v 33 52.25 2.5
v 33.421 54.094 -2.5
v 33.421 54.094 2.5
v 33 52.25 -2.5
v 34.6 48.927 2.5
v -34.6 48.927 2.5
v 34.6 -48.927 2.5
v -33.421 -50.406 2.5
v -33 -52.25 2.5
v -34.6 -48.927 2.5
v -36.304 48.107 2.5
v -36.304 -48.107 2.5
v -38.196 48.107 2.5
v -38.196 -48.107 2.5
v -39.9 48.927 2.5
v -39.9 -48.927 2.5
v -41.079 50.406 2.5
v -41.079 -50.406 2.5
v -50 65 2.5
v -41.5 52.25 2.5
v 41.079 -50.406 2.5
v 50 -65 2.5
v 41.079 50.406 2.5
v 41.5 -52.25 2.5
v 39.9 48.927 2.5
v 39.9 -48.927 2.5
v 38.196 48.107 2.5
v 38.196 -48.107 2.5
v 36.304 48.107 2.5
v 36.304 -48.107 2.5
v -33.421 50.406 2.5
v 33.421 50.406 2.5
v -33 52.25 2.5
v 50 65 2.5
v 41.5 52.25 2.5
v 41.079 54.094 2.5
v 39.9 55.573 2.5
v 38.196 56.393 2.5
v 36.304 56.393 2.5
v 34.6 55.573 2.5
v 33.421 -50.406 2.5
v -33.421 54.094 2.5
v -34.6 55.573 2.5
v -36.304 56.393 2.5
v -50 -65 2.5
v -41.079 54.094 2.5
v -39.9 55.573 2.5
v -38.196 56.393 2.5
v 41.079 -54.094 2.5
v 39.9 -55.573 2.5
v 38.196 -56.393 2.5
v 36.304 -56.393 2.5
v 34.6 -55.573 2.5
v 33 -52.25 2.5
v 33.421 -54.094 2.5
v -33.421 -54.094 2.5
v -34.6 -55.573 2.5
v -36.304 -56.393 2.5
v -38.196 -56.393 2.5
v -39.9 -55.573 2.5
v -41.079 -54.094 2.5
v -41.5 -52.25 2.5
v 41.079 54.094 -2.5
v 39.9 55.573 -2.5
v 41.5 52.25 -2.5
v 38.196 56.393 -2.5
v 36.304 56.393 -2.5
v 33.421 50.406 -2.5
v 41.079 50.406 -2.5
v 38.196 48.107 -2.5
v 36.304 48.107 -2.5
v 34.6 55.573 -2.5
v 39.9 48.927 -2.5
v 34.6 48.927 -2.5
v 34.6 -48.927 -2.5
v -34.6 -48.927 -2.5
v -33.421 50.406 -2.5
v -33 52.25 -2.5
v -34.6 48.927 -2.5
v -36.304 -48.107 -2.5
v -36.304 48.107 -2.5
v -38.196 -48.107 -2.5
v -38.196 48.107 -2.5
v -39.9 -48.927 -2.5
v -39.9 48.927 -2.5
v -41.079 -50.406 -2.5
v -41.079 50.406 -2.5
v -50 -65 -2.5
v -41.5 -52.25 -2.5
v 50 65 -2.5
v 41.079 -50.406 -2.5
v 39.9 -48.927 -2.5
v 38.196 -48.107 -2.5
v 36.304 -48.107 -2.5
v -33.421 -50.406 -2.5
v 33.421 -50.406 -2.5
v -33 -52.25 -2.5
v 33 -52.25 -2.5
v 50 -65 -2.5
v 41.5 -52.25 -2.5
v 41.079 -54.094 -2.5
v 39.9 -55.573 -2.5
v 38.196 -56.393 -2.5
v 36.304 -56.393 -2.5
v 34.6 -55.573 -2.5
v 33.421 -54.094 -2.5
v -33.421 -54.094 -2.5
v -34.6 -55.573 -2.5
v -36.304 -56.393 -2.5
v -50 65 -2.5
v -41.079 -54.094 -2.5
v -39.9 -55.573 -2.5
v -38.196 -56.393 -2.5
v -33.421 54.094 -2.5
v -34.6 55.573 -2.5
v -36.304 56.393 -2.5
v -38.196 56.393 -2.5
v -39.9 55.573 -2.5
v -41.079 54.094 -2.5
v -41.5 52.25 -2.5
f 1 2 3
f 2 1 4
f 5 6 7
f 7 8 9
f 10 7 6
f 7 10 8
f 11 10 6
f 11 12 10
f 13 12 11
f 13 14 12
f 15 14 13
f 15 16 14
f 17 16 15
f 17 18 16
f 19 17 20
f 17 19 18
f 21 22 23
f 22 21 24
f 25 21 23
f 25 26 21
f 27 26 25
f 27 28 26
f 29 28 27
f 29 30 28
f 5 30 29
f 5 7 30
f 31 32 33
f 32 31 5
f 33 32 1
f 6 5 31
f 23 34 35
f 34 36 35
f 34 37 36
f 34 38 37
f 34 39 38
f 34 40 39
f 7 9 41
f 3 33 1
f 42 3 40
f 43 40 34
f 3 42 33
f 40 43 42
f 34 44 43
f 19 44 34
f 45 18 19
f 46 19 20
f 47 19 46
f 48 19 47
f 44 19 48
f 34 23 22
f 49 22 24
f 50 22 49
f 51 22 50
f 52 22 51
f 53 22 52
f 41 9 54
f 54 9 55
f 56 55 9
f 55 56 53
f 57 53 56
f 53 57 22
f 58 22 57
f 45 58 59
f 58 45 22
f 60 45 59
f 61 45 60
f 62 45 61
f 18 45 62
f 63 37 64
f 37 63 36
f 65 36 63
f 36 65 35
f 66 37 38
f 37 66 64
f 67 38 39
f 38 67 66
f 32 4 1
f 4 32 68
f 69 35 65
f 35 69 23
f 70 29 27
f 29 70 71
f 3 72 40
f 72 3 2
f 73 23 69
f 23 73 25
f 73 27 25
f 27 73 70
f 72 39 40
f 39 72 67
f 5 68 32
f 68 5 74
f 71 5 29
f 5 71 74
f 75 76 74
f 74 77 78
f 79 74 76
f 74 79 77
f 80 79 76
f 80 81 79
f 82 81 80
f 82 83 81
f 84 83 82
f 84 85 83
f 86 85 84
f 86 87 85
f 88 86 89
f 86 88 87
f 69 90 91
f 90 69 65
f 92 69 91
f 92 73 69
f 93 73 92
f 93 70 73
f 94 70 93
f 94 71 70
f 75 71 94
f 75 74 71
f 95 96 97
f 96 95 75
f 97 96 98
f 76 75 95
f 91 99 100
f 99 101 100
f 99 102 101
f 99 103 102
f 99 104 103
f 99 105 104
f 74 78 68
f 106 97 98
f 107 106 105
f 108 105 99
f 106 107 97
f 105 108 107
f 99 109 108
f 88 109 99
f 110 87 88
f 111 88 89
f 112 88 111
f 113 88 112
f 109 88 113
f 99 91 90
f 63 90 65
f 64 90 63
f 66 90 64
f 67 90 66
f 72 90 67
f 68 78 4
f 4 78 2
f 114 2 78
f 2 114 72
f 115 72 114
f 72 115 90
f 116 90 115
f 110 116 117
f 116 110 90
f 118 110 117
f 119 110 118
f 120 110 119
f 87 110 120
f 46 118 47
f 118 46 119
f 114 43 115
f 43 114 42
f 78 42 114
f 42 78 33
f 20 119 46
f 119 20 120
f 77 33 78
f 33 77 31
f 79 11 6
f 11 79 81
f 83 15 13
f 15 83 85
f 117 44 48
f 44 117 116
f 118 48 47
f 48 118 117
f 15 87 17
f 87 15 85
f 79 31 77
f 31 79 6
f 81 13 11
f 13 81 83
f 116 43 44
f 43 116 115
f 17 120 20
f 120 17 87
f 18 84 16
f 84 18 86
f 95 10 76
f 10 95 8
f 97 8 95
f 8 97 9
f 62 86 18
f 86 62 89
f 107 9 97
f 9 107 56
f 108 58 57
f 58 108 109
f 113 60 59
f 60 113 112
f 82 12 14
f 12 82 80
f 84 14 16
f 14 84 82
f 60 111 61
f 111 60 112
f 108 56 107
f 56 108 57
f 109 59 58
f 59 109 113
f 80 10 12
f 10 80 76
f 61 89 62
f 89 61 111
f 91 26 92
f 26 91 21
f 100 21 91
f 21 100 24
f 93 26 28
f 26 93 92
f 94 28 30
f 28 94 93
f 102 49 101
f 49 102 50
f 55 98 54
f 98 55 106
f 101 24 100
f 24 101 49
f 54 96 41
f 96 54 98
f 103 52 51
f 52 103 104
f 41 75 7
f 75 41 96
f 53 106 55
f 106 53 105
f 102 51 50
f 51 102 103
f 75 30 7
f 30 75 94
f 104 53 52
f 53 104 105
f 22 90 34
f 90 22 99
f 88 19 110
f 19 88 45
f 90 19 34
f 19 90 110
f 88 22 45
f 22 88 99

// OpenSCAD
// Generated by SolidPython 1.1.3 on 2023-10-16 12:08:39


difference() {
	cube(center = true, size = [100, 130.0000000000, 5]);
	union() {
		translate(v = [37.2500000000, 52.2500000000]) {
			cylinder(center = true, h = 5, r = 4.2500000000);
		}
		translate(v = [-37.2500000000, 52.2500000000]) {
			cylinder(center = true, h = 5, r = 4.2500000000);
		}
		translate(v = [-37.2500000000, -52.2500000000]) {
			cylinder(center = true, h = 5, r = 4.2500000000);
		}
		translate(v = [37.2500000000, -52.2500000000]) {
			cylinder(center = true, h = 5, r = 4.2500000000);
		}
	}
}
/***********************************************
*********      SolidPython code:      **********
************************************************
 
import solid
import numbers
import pudb
from solid.utils import *
import viewscad
import subprocess
import os
import os.path as osp
import math
import sys

chamfer_extrude=solid.import_scad("./chamfer_extrude.scad")
chamfer_extrude=chamfer_extrude.chamfer_extrude
r = viewscad.Renderer(width=800, height=800)

def debug(model,f_name,path="/home/ts/code/projects/mfd/designs/debug"):
    solid.scad_render_to_file(model,osp.join(path,f_name)+".scad")
#generate position list of wells using offset from center
wells_pos_from_center_4 = lambda offset: [[-offset,offset],
                                        [offset, offset],
                                        [-offset, -offset],
                                        [offset, -offset]]
#wells_pos_from_center_2 = lambda offset: [[0,offset],
#                                        [0, -offset]]
wells_pos_from_center_2 = lambda offset: [[offset,0],
                                        [-offset,0]]

def make_well(dims,shape=None,height=None,dxf=False):
    def circle_cylinder():
        if dxf or (height is None):
            well = solid.circle(r=dims, segments=64)
        else:
            well = solid.cylinder(r=dims, h=height, segments=64, center = True)
        return well
    if dims is None:
        sys.exit("radius needs to be a number")
    if isinstance(dims, numbers.Number):
        well =circle_cylinder()
    elif len(dims)==1:
        if isinstance(dims[1], numbers.Number):
            well =circle_cylinder()
        else:
            sys.exit("radius needs to be a number")
    elif len(dims)==2:
        well = solid.square(dims,center = True)
    elif len(dims)==3:
        well = solid.cube(dims, center = True)
    return well

def wells_top_bottom(center_gap,device_dims=None,shape=None,height=None, positions = None, dxf = False):
    well_shape = make_well(device_dims,shape=shape,height=height,dxf=dxf)
    wells = []
    if positions is None:
        offset = radius+radius/2.0
        positions = wells_pos_from_center_2(offset)
    if dxf or (height is None):
        height = 0
    for position in positions:
        if dxf:
            wells.append(solid.translate([position[0],position[1]])(well_shape))
        else:
            wells.append(solid.translate([position[0],position[1],height/2.0])(well_shape))
    return  union()(*wells)

#place wells in four corners 
def four_corner(radius,height=None, positions = None, dxf = False):
    #if well pos not specified set
    #to equally spaced by half radius
    if positions is None:
        offset = radius+radius/2.0
        positions = wells_pos_from_center_4(offset)
    if dxf or (height is None):
        height = 0
    #make wells at positions with specified radius and height
    wells = []
    for position in positions:
        #make circle if making dxf
        if dxf:
            well_shape = solid.circle(r=radius, segments=64)
            well_shape = solid.translate([position[0],position[1]])(well_shape)
        #if stl make cylinder
        else:
            well_shape = solid.cylinder(r=radius, h=height, segments=64, center = True)
            well_shape = solid.translate([position[0],position[1],height/2.0])(well_shape)
        wells.append(well_shape)
    return  union()(*wells)

#generate channels 
def make_channels(length,width,height=0,num_chans=1,max_chans=None,spacing=None, dxf = False,
                  rotate_channels=False):
    if dxf or (height is None):
        height = 0
    #if channel gap not defined, is equal to
    if spacing is None: spacing = width
    #calculate number of channels if fitting max num within given width
    if not max_chans is None:
        import math
        num_chans = math.floor((max_chans-spacing)/(width+spacing))
    #get total width of channel section  
    total_width = (width*num_chans)+(spacing*(num_chans-1))

    #make template channel
    #if rotate_channels: width, length = length, width
    if dxf:
        channel_t = solid.square([length,width],center = True)
    else:
        channel_t = solid.cube([length,width,height], center = True)

    #if number channels is even, offset the first channel to center its gap
    if num_chans % 2 == 0: centering = -(width/2.0+spacing/2.0)
    else: centering = 0
    #move template channel up to align bottom at z = 0 
    #and offset center if necessary
    if dxf:
        channel_t = solid.translate([0,centering])(channel_t)
    else:
        channel_t = solid.translate([0,centering,height/2.0])(channel_t)

    #if rotate_channels: length,width = width,length
    #start making the channels
    channels = []
    for i in range(num_chans):
        #if i=0 there is no translation
        #if i=1, we make the first channel adjacent to second
        direction = i

        #if i>=1, we add channels alternating left and right
        if i >= 1:
            direction = -(i/2.0)
            if i % 2 == 1: direction = (-direction)+0.5
                
        #make channel at right position and add it to channel list
        translation_coords = [0,direction*(width+spacing)]
        #if rotate_channels: translation_coords = [direction*(width+spacing),0]
        if dxf:
            channel = solid.translate(translation_coords)(channel_t)
        else:
            channel = solid.translate([*translation_coords,0])(channel_t)
        channels.append(channel)
    
    #group all channels as one object
    channels = union()(*channels)
    #compute the x,y,z dimensions in order to pass as arguments 
    #for construction of other parts of device (such as the chambers)
    measurements = {'x':(length/2.0,-length/2.0),
                    'y':(total_width/2.0,-total_width/2.0)}
    if not dxf:
        measurements['z'] = (height,0)
    if rotate_channels:
        channels = solid.rotate(90)(channels)
        measurements['x'],measurements['y']=measurements['y'],measurements['x']
    return channels,measurements

def make_chambers(msrs,height=None,extra=0,len_until=None,width=None, dxf = False):
    #computes x,y,z length
    total = lambda x : abs(x[0]) + abs(x[1])
    
    #if specific height if specified
    #otherwise use same height as channels
    if dxf:
        pass
    elif not height is None:
        msrs['z'] = (height,0)
    else:
        msrs['z'] = (0,0)
        
    #make copy of measurements from channels to modify chamber dimensions 
    #and add length to chambers as specified
    chamber_dims = msrs.copy()
    #calculate length of chamber to reach specified offset
    if not len_until is None:
        chamber_len = len_until-(msrs['x'][0])
    #or add specified length to channel length (if not specified, adds 0)
    else:
        chamber_len = msrs['x'][0]+extra
    #set the chamber length based 
    chamber_dims['x'] = (chamber_len/2.0,-(chamber_len/2.0))
    #compute final dimensions of chamber
    if not width is None:
        chamber_dims['y'] = (width/2.0,-width/2.0)
    chamber_dims = [total(size) for size in chamber_dims.values()]
        
    #calculate chamber translation offset to place adjacent to channels
    chamber_trslt = msrs['x'][0]+(chamber_len/2.0)
    #compute chamber translation coordinates to align with channels
    #x = 1 moves chamber above channels
    #x = -1 moves chamber below channels
    if dxf:
        trslt = lambda x : [x*(chamber_trslt),0]
    else:
        trslt = lambda x : [x*(chamber_trslt),0,msrs['z'][0]/2.0]
    
    #function to make chamber at top or at bottom 
    if dxf:
        move = lambda x : solid.translate(trslt(x))(solid.square(chamber_dims, center = True) )
    else:
        move = lambda x : solid.translate(trslt(x))(solid.cube(chamber_dims,center = True))
    #make top and bottom chambers and return them as grouped
    top = move(1)
    bottom = move(-1)
    #chambers=solid.rotate(90)(solid.union()(top,bottom))
    chambers=(solid.union()(top,bottom))

    return chambers

#create alignment features 
def alignment_features(unit,dims,grid_size, mask_size = None, alignment = "hollow", units_from_center = (2.5,2.5), corner_len=None):
    width = grid_size[0]*dims[0]
    length = grid_size[1]*dims[1]
    if mask_size is None and corner_len is None:
        corner_len = (dims[0] + dims[1]) /2 / 8
    corner = lambda thickness_div : solid.union()( solid.square([corner_len,corner_len/thickness_div],center=False), solid.square([corner_len/thickness_div,corner_len],center=False) )
    
    def make_full(thickness_div):
        thickness = corner_len/thickness_div
        tr = solid.translate([0, 0, 0 ])(solid.rotate(180)(corner(thickness_div)))
        tr = solid.translate([thickness/2,thickness/2,0])(tr)
        bl = solid.translate([0, 0, 0 ])(solid.rotate(0)(corner(thickness_div)))
        bl = solid.translate([-thickness/2,-thickness/2,0])(bl)
        return solid.union()(tr,bl)
    
    def make_hollow(thickness_div):
        thickness = corner_len/(thickness_div/2)
        inner = make_full(thickness_div)
        outer = make_full(thickness_div/2)
        hollow = outer - inner 
        return hollow
    
    center = (width /2 , length/2)
    mask_pos = lambda x,y : (center[0] + x*(float(units_from_center[0])*dims[0]), center[1] + y*(float(units_from_center[1])*dims[1]))
    positions = []
    positions.append(mask_pos(1,0))
    positions.append(mask_pos(0,1))
    positions.append(mask_pos(-1,0))
    positions.append(mask_pos(0,-1))
    make_mask = lambda mtype : make_hollow(8) if mtype == "hollow" else make_full(8)
    masks = [ solid.translate([*position,0])(make_mask(alignment)) for position in positions]
    
    solid.scad_render_to_file(solid.union()(*masks),"./designs/open_chamber/masks.scad")
    #return unit - solid.union()(*masks)
    return solid.union()(*masks,unit)

def create_outline(thickness, array, dims, grid_size,):
    width = grid_size[0]*dims[0] + thickness *2
    length = grid_size[1]*dims[1] + thickness *2
    outer = solid.translate([-thickness, -thickness,0])(solid.square([width, length]))
    return outer-array

def create_wall(wall_thickness, outline_thickness, dims, grid_size, wall_height = 2000, dxf = False):
    inner_width = grid_size[0]*dims[0] + outline_thickness *2
    inner_length = grid_size[1]*dims[1] + outline_thickness *2
    outer_width = inner_width + wall_thickness * 2
    outer_length = inner_length + wall_thickness * 2
    outer_pos_x = -outline_thickness-wall_thickness
    outer_pos_y = -outline_thickness-wall_thickness
    inner_pos_x = -outline_thickness
    inner_pos_y = -outline_thickness
    if dxf:
        inner_wall = solid.translate([inner_pos_x,
                                      inner_pos_y,
                                      0])(solid.square([inner_width, inner_length]))
        outer_wall = solid.translate([outer_pos_x,
                                      outer_pos_y,
                                      0])(solid.square([outer_width, outer_length]))

        return outer_wall-inner_wall
    else:
        inner_wall = solid.translate([inner_pos_x,
                                      inner_pos_y,
                                      0])(solid.cube([inner_width, inner_length,wall_height]))
        outer_wall = solid.translate([outer_pos_x,
                                      outer_pos_y,
                                      0])(solid.cube([outer_width, outer_length,wall_height]))

        return outer_wall-inner_wall, {'wall_height': wall_height,
                                       'wall_thickness': wall_thickness,
                                       'inner_width':inner_width,
                                       'inner_length': inner_length,
                                       'outer_width': outer_width,
                                       'outer_length': outer_length,
                                       'outer_pos_x' : outer_pos_x,
                                       'outer_pos_y' : outer_pos_y,
                                       'inner_pos_x' : inner_pos_x,
                                       'inner_pos_y' : inner_pos_y}

def create_thicker_wall(wall_thickness, outer_wall_offset, wall_dims, dims, grid_size, height_start = .2, height_end=2, dxf = False):
    addon_wall,thicker_wall_dims = create_wall(wall_thickness, outer_wall_offset, dims, grid_size, wall_height=height_end-height_start, dxf = False)
    addon_wall = solid.translate([0,0,height_start])(addon_wall)

    thicker_wall_dims['wall_height'] = height_end
    thicker_wall_dims['wall_thickness'] = wall_dims['wall_thickness'] + wall_thickness
    return addon_wall, thicker_wall_dims
 
def add_lock_to_wall(wall,wall_dims,y_offset = 0,cut_ratio=0.7,L_length=3, gap_ratio=0.05, axis="x",width_ratio=1/2):
    # Makes L shape
    def make_L(max_length,length_thickness,max_width,width_thickness,height,y_offset):
        length = solid.cube([max_length,length_thickness,height])
        width = solid.cube([width_thickness,max_width,height])
        width = solid.translate([max_length-(width_thickness),0,0])(width)
        L = solid.union()(width,length)
        debug(L,"L")
        if axis == "x":
            L = solid.rotate(-90)(L)
            L = solid.translate([0,max_length,0])(L)
        else:
            L = solid.rotate(-180)(L)
            L = solid.translate([max_length,max_width,0])(L)
        return solid.translate([0,0,y_offset])(L)
    
    lock_length = L_length
    lock_width = wall_dims['wall_thickness']*width_ratio
    lock_length_thickness = lock_width/2
    lock_width_thickness = lock_width/2
    L_lock = make_L(lock_length,lock_length_thickness,lock_width,lock_width_thickness, wall_dims['wall_height']-y_offset, y_offset)
    
    margin_space = lock_length - lock_length*(1-gap_ratio)
    key_length = lock_length-margin_space
    key_length_thickness = lock_length_thickness-(margin_space*2)
    key_width = lock_width-(margin_space*2)
    key_width_thickness = lock_width_thickness-(margin_space*2)
    L_key = make_L(key_length,key_length_thickness,key_width,key_width_thickness, wall_dims['wall_height']-y_offset, y_offset)
    L_key = solid.translate([margin_space,margin_space,0])(L_key)
    L = solid.union()(L_lock,L_key)
    debug(L,"L")
    
    #Make cube to be used as negative to split frame in a half
    #Can choose if making left or right negative, specify ratio of split
    def make_negative(right,cut_ratio):
        if axis == "x":
            if right:
                length = wall_dims['outer_length']*(1-cut_ratio)
                pos_x = wall_dims['outer_pos_x']+(wall_dims['outer_length']*cut_ratio)
            else:
                length = wall_dims['outer_length']*(cut_ratio)
                pos_x = wall_dims['outer_pos_x'] 
            negative = solid.cube([wall_dims['outer_width'],length, wall_dims['wall_height']])
            negative = solid.translate([wall_dims['outer_pos_y'],pos_x,0])(negative)
        else:
            if right:
                length = wall_dims['outer_width']*(1-cut_ratio)
                pos_x = wall_dims['outer_pos_y']+(wall_dims['outer_width']*cut_ratio)
            else:
                length = wall_dims['outer_width']*(cut_ratio)
                pos_x = wall_dims['outer_pos_y'] 
            negative = solid.cube([length,wall_dims['outer_length'], wall_dims['wall_height']])
            negative = solid.translate([pos_x,wall_dims['outer_pos_x'],0])(negative)
        return negative, pos_x, length 
                      
    #Make negatives
    negative_right, right_half_pos_x, right_half_length = make_negative(True,cut_ratio)
    negative_left, left_half_pos_x, right_half_length = make_negative(False,cut_ratio)
    #Make halves
    left_half = solid.difference()(wall,negative_right)
    right_half = solid.difference()(wall,negative_left)
    def place_L(L, L_length,L_width):
        #Place L on top wall       
        offset_to_center = (wall_dims['wall_thickness']-L_width)/2
        if axis == "x":
            y_pos_top = (wall_dims['outer_pos_y'] +
                    wall_dims['outer_width'] - 
                    L_width - offset_to_center)
            top_L = solid.translate([y_pos_top,
                                     right_half_pos_x-(L_length),
                                     0])(L)
            #Place L on bottom wall       
            y_pos_bottom = wall_dims['outer_pos_y']+offset_to_center
            bottom_L = solid.translate([y_pos_bottom,
                                        right_half_pos_x-L_length,
                                        0])(L)
        else:
            y_pos_top = (wall_dims['outer_pos_x'] +
                    wall_dims['outer_length'] -
                    (L_width+offset_to_center))
            top_L = solid.translate([right_half_pos_x-L_length,
                                     y_pos_top,
                                     0])(L)
            #Place L on bottom wall       
            y_pos_bottom = wall_dims['outer_pos_y']+offset_to_center
            bottom_L = solid.translate([right_half_pos_x-L_length,
                                        y_pos_bottom,
                                        0])(L)
        return bottom_L, top_L
    #Make complimentary L pieces through union and differences
    #Make Lock
    bottom_L_lock, top_L_lock = place_L(L_lock,L_length,lock_width)
    left_half = solid.difference()(left_half,bottom_L_lock)
    left_half = solid.difference()(left_half,top_L_lock)
    #Make Key
    bottom_L_key, top_L_key = place_L(L_key,L_length,lock_width)
    right_half = solid.union()(right_half,bottom_L_key)
    right_half = solid.union()(right_half,top_L_key)
    return left_half, right_half


#build a row x col grid of containment units
def make_unit_array(unit,dims,grid_size, dxf = False, alignment = None, mask_size = None,
                    units_from_center = None,alignment_offset=None, alignment_mark_size=1):
    units = []
    for col in range(grid_size[1]):
        for row in range(grid_size[0]):
            if dxf:
                units.append(solid.translate([row*dims[0],col*dims[1]])(unit))
            else:
                units.append(solid.translate([row*dims[0],col*dims[1],dims[2]/2.0])(unit))
    array = solid.union()(*units)
    if (not alignment is None) and dxf:
        if not alignment_offset is None:
            array = solid.translate([alignment_offset[0],alignment_offset[1]])(array)
        array = alignment_features(array,dims, grid_size, alignment = alignment, mask_size = None, units_from_center = units_from_center,corner_len=alignment_mark_size)
        if not alignment_offset is None:
            array = solid.translate([-alignment_offset[0],-alignment_offset[1]])(array)
    return array


def make_taylor(wells_pos = wells_pos_from_center_4(2.25), well_rad = 1.5 ,
                well_height = 2, chan_w = 0.01, chan_l = 1, chan_h = 0.010 ,
                chan_gap = 0.040, max_chans = None,num_chans=100, chamber_height  = 0.100,
                columns = 1, rows = 1, chamber_len_until=2.25, add_channels = True, add_wells = True, 
                add_chambers = True, save_path = "./", alignment = None, units_from_center = 2,
                mask_size = None, render_stl = False, outline_thickness = 0.050, dxf = True,
                wall_height = 15, wall_thickness = 0.95, casing_x=9, casing_y=9, casing_z=0,rotate_units=0):

    dims = [casing_x, casing_y, casing_z]
    wells = four_corner(well_rad,well_height, dxf = dxf, positions = wells_pos)
    debug(wells,"wells")
    channels, msrs = make_channels(chan_l,chan_w,chan_h,dxf=dxf, spacing = chan_gap, max_chans=max_chans,num_chans=num_chans)
    debug(channels,"channels")
    chambers = make_chambers(msrs,dxf = dxf, height=chamber_height,len_until=chamber_len_until)
    debug(chambers,"chambers")

    #add together and render
    device_parts = []
    if add_channels:
        device_parts.append(channels)
    if add_wells:
        device_parts.append(wells)
    if add_chambers:
        device_parts.append(chambers)
    device=union()(*device_parts)
    device = rotate(rotate_units)(device)

    device=solid.translate([dims[0]/2.0,dims[1]/2.0,0])(device)
    channels = rotate(rotate_units)(channels)
    channels=solid.translate([dims[0]/2,dims[1]/2,0])(channels)
    chambers_wells = union()(wells,chambers)
    chambers_wells = rotate(rotate_units)(chambers_wells)
    chambers_wells=solid.translate([dims[0]/2,dims[1]/2,0])(chambers_wells)

    file_name = str(rows)+'x'+str(columns)+'_units_'
    grid_size = [rows,columns]

    if alignment:
        alignment="full"
    device = make_unit_array(device,dims,grid_size, dxf=dxf, alignment = alignment,
                                 units_from_center = units_from_center)
    channels = make_unit_array(channels,dims,grid_size, dxf=dxf, alignment = alignment,
                                 units_from_center = units_from_center)
    if alignment=="full":
        alignment="hollow"

    chambers_wells = make_unit_array(chambers_wells,dims,grid_size, dxf=dxf, alignment = alignment,
                                 units_from_center =units_from_center)

    def save_model(model,prefix):
        model_fname = os.path.abspath(save_path+prefix+"_"+file_name+".scad")
        solid.scad_render_to_file(model,model_fname)
        return model_fname

    wells_fname = save_model(wells,"wells")
    channels_fname = save_model(channels,"channels")
    device_fname = save_model(device,"device")
    chambers_wells_fname = save_model(chambers_wells,"chambers_wells")
    return (chambers_wells,chambers_wells_fname), (channels,channels_fname), (device,device_fname)

def make_device(design='open',rows=8,columns=6,wells_pos = 4.5,well_offset=3.2, well_rad=3.2,well_height=0.1,
                chan_l=1,chan_w=0.01,chan_h=0.01,chan_gap=0.015,num_chans=101,dxf=True,save_path="./designs/open_chamber/",
                casing_x=9.0,casing_y=18.0,casing_z=0,rotate_units=90,units_from_center=(3,1),chamber_len_until=4.5,
                chamber_width=None,alignment=True, add_wells=True, add_channels=True,add_chambers=True):

    dims = [casing_x, casing_y, casing_z]
    if design == "open":
        wells_pos=wells_pos_from_center_2(wells_pos)
        wells = wells_top_bottom(well_offset*2,device_dims=well_rad,height=well_height, dxf = dxf, positions = wells_pos)
    elif design == "closed":
        wells_pos=wells_pos_from_center_4(wells_pos)
        debug(wells,"wells")
        wells = four_corner(well_offset,well_heightdevice_dims=well_rad, dxf = dxf, positions = wells_pos)
    else:
        print(design+" is not a valid design.\n Choose valid design: 'open' or 'closed'")
        exit()
    wells = rotate(rotate_units)(wells)
    wells=solid.translate([dims[0]/2,dims[1]/2,0])(wells)
    debug(wells,"wells")

    channels, msrs = make_channels(chan_l,chan_w,chan_h,dxf=dxf, spacing = chan_gap, num_chans=num_chans,rotate_channels=False)
    channels = rotate(rotate_units)(channels)
    channels=solid.translate([dims[0]/2,dims[1]/2,0])(channels)

    chambers=make_chambers(msrs,height=None,extra=0,len_until=chamber_len_until, width=chamber_width,dxf = dxf)
    chambers = rotate(rotate_units)(chambers)
    chambers=solid.translate([dims[0]/2,dims[1]/2,0])(chambers)

    device_parts = []
    if add_channels:
        device_parts.append(channels)
    if add_wells:
        device_parts.append(wells)
    if add_chambers:
        device_parts.append(chambers)
    device = union()(*device_parts)
    #device = rotate(rotate_units)(device)
    #device=solid.translate([dims[0]/2.0,dims[1]/2.0,0])(device)

    chambers_wells = []
    if add_chambers:
        chambers_wells.append(chambers)
    if add_wells:
        chambers_wells.append(wells)
    chambers_wells = union()(*chambers_wells)
    #chambers_wells = union()(wells,chambers)
    #chambers_wells = rotate(rotate_units)(chambers_wells)
    #chambers_wells=solid.translate([dims[0]/2,dims[1]/2,0])(chambers_wells)

    file_name = str(rows)+'x'+str(columns)+'_units_'

    grid_size = [rows,columns]
    if alignment:
        alignment="full"
    device = make_unit_array(device,dims,grid_size, dxf=dxf, alignment = alignment,
                                 units_from_center = units_from_center)
    channels = make_unit_array(channels,dims,grid_size, dxf=dxf, alignment = alignment,
                                 units_from_center = units_from_center)
    if alignment=="full":
        alignment="hollow"

    chambers_wells = make_unit_array(chambers_wells,dims,grid_size, dxf=dxf, alignment = alignment,
                                 units_from_center =units_from_center)

    def save_model(model,prefix):
        model_fname = os.path.abspath(save_path+prefix+"_"+file_name+".scad")
        solid.scad_render_to_file(model,model_fname)
        return model_fname

    wells_fname = save_model(wells,"wells")
    channels_fname = save_model(channels,"channels")
    device_fname = save_model(device,"device")
    chambers_wells_fname = save_model(chambers_wells,"chambers_wells")
    return (chambers_wells,chambers_wells_fname), (channels,channels_fname), (device,device_fname)


def make_open_chamber(rows=8,columns=6,wells_pos = wells_pos_from_center_2(4.5), well_rad=3.2,well_height=0.1,
                      chan_l=1,chan_w=0.01,chan_h=0.01,chan_gap=0.015,num_chans=101,dxf=True,save_path="./designs/open_chamber/",
                      casing_x=9.0,casing_y=18.0,casing_z=0,rotate_units=90,units_from_center=(3,1),chamber_len_until=4.5,
                      chamber_width=None,alignment=True, add_wells=True, add_channels=True,add_chambers=True):

    dims = [casing_x, casing_y, casing_z]
    wells = wells_top_bottom(well_rad,height=well_height, dxf = dxf, positions = wells_pos)
    channels, msrs = make_channels(chan_l,chan_w,chan_h,dxf=dxf, spacing = chan_gap, num_chans=num_chans,rotate_channels=False)
    chambers=make_chambers(msrs,height=None,extra=0,len_until=chamber_len_until, width=chamber_width,dxf = dxf)
    debug(chambers,"chambers")
    device_parts = []
    if add_channels:
        device_parts.append(channels)
    if add_wells:
        device_parts.append(wells)
    if add_chambers:
        device_parts.append(chambers)
    device = union()(*device_parts)
    device = rotate(rotate_units)(device)
    device=solid.translate([dims[0]/2.0,dims[1]/2.0,0])(device)
    channels = rotate(rotate_units)(channels)
    channels=solid.translate([dims[0]/2,dims[1]/2,0])(channels)
    chambers_wells = union()(wells,chambers)
    chambers_wells = rotate(rotate_units)(chambers_wells)
    chambers_wells=solid.translate([dims[0]/2,dims[1]/2,0])(chambers_wells)

    file_name = str(rows)+'x'+str(columns)+'_units_'

    grid_size = [rows,columns]
    if alignment:
        alignment="full"
    device = make_unit_array(device,dims,grid_size, dxf=dxf, alignment = alignment,
                                 units_from_center = units_from_center)
    channels = make_unit_array(channels,dims,grid_size, dxf=dxf, alignment = alignment,
                                 units_from_center = units_from_center)
    if alignment=="full":
        alignment="hollow"

    chambers_wells = make_unit_array(chambers_wells,dims,grid_size, dxf=dxf, alignment = alignment,
                                 units_from_center =units_from_center)

    def save_model(model,prefix):
        model_fname = os.path.abspath(save_path+prefix+"_"+file_name+".scad")
        solid.scad_render_to_file(model,model_fname)
        return model_fname

    wells_fname = save_model(wells,"wells")
    channels_fname = save_model(channels,"channels")
    device_fname = save_model(device,"device")
    chambers_wells_fname = save_model(chambers_wells,"chambers_wells")
    return (chambers_wells,chambers_wells_fname), (channels,channels_fname), (device,device_fname)

def to_dxf(scad_path):
    dxf_path = scad_path.replace(".scad",".dxf")
    subprocess.call(["openscad", "-o", dxf_path, scad_path])
    import ezdxf
    temp_dxf = ezdxf.readfile(dxf_path)
    temp_dxf.saveas(dxf_path)

#def make_walls(diameter,thickness,grid_size,dims,height=20,segments=256,make_inner=True):
#    wafer_wall_out = solid.cylinder(r=diameter/2,h=height, segments=segments)
#    wafer_wall_in = solid.cylinder(r=(diameter/2-thickness),h=height, segments=segments)
#    wafer_wall = solid.difference()(wafer_wall_out,wafer_wall_in)
#    wafer_wall = solid.translate([grid_size[1]*dims[1]/2.0,grid_size[0]*dims[0]/2.0])(wafer_wall)
#
#    vertical_wall_length = grid_size[1]*dims[1]
#    horizontal_wall_length = grid_size[0]*dims[0]
#    vertical_wall = solid.cube([vertical_wall_length,thickness,height],center = True)
#    vertical_wall = solid.translate([vertical_wall_length/2,0,height/2])(vertical_wall)
#    horizontal_wall = solid.cube([thickness,horizontal_wall_length,height],center = True)
#    horizontal_wall = solid.translate([0,vertical_wall_length/2,height/2])(horizontal_wall)
#    walls = []
#    walls.append(horizontal_wall)
#    walls.append(vertical_wall)
#    for col in range(grid_size[1]):
#        if col == grid_size[1]-1: 
#            walls.append(solid.translate([0,(col+1)*dims[1]])(vertical_wall))
#        elif col > 0 and col < grid_size[1]-1 and make_inner==True:
#            walls.append(solid.translate([0,(col+1)*dims[1]])(vertical_wall))
#    for row in range(grid_size[0]):
#        if row == grid_size[0]-1: 
#            walls.append(solid.translate([(row+1)*dims[0],0])(horizontal_wall))
#        elif row > 0 and row < grid_size[0]-1 and make_inner==True:
#            walls.append(solid.translate([(row+1)*dims[0],0])(horizontal_wall))
#    walls = union()(*walls)
#    wafer_walls = union()(walls,wafer_wall)
#    return walls,wafer_wall,wafer_walls

def make_walls(diameter,thickness,grid_size,dims,height=20,segments=256,make_inner=True,padx=0,pady=0):
    wafer_wall_out = solid.cylinder(r=diameter/2,h=height, segments=segments)
    wafer_wall_in = solid.cylinder(r=(diameter/2-thickness),h=height, segments=segments)
    wafer_wall = solid.difference()(wafer_wall_out,wafer_wall_in)
    wafer_wall = solid.translate([grid_size[1]*dims[1]/2.0,grid_size[0]*dims[0]/2.0])(wafer_wall)

    vertical_wall_length = grid_size[0]*dims[0]+padx
    horizontal_wall_length = grid_size[1]*dims[1]+pady
    vertical_wall = solid.cube([vertical_wall_length,thickness,height],center = True)
    vertical_wall = solid.translate([vertical_wall_length/2-pady/2,-padx/2,height/2])(vertical_wall)
    horizontal_wall = solid.cube([thickness,horizontal_wall_length,height],center = True)
    horizontal_wall = solid.translate([-pady/2,horizontal_wall_length/2-padx/2,height/2])(horizontal_wall)
    walls = []
    walls.append(horizontal_wall)
    walls.append(vertical_wall)
    for col in range(grid_size[1]):
        if col == grid_size[1]-1: 
            walls.append(solid.translate([0,(col+1)*dims[1]+pady])(vertical_wall))
        elif col > 0 and col < grid_size[1]-1 and make_inner==True:
            walls.append(solid.translate([0,(col+1)*dims[1]])(vertical_wall))
    for row in range(grid_size[0]):
        if row == grid_size[0]-1: 
            walls.append(solid.translate([(row+1)*dims[0]+padx,0])(horizontal_wall))
        elif row > 0 and row < grid_size[0]-1 and make_inner==True:
            walls.append(solid.translate([(row+1)*dims[0],0])(horizontal_wall))
    walls = union()(*walls)
    wafer_walls = union()(walls,wafer_wall)
    return walls,wafer_wall,wafer_walls

def save_model(model,base_path,base_name,dxf=True):
    if not os.path.exists(base_path):
        os.makedirs(base_path)
    dxf_path=osp.join(base_path,base_name+".scad")
    solid.scad_render_to_file(model,osp.join(dxf_path))
    if dxf:
        to_dxf(dxf_path)

def make_wafer(diameter,flat_len,thickness):
    wafer = solid.cylinder(r1=diameter/2,r2=diameter/2,h=thickness,segments=512,)()
    x_start_flat=(flat_len/2)
    y_start_flat = math.sqrt(((diameter/2)**2) - (x_start_flat**2) )
    height_delete_flat=diameter/2-y_start_flat
    flat_delete = solid.cube([flat_len,height_delete_flat,thickness],center=False)()
    flat_delete = solid.translate([-flat_len/2,y_start_flat,0])(flat_delete)
    wafer = solid.difference()(wafer,flat_delete)
    wafer = solid.rotate(90)(wafer)
    return wafer

def add_wafer_to_mask(wafer_size,flat_len,mask,grid_size,dims,wafer_line_thickness=0.1,outer_mask_thickness=5,alignment_offset=None):
    def make_wafer_mask(wafer_size,flat_len):
        wafer_mask = make_wafer(wafer_size,flat_len,1)
        wafer_mask = solid.projection()(wafer_mask)
        wafer_mask = solid.translate([grid_size[0]*dims[0]/2.0,grid_size[1]*dims[1]/2.0])(wafer_mask)
        if not alignment_offset is None:
            wafer_mask = solid.translate([-alignment_offset[0],-alignment_offset[1]])(wafer_mask)
        return wafer_mask

    inner_wafer_line_mask = make_wafer_mask(wafer_size-wafer_line_thickness/2,flat_len)
    outer_wafer_line_mask = make_wafer_mask(wafer_size+wafer_line_thickness/2,flat_len)
    outer_wafer_mask = make_wafer_mask(wafer_size+outer_mask_thickness,flat_len)
    outer_wafer_mask = solid.difference()(outer_wafer_mask,outer_wafer_line_mask)
    wafer_mask = solid.union()(outer_wafer_mask,inner_wafer_line_mask)

    return solid.difference()(wafer_mask,mask)

def make_posts(post_shape,post_height):
    posts = solid.linear_extrude(height=post_height)(post_shape)
    return posts

def make_wafer_empty(diameter,flat_len,thickness,margin,notch_len=20,notch_height=5,oversize=1.01):
    diameter*=oversize
    flat_len*=oversize
    wafer = make_wafer(diameter,flat_len,thickness)
    holder = solid.cylinder(r1=diameter/2+margin,r2=diameter/2+margin,h=thickness,segments=512)()
    holder = solid.difference()(holder,wafer)

    x_start_flat=(flat_len/2)
    y_start_flat = math.sqrt(((diameter/2)**2) - (x_start_flat**2) )
    height_delete_flat=diameter/2-y_start_flat
    notch = solid.cube([notch_len,notch_height,thickness],center=False)()
    notch = solid.translate([-notch_len/2,y_start_flat,0])(notch)
    notch = solid.rotate(90)(notch)
    return solid.difference()(holder,notch)

def wafer_print_calibration(diameter,thickness,height,z_offset):
    circles = []
    radii = []
    radii.append(diameter/2.0*0.8)
    radii.append(diameter/2.0*0.6)
    radii.append(diameter/2.0*0.4)
    radii.append(diameter/2.0*0.2)
    for radius in radii:
        inner = solid.cylinder(r1=radius-(thickness/2.0),r2=radius-(thickness/2.0),h=thickness,segments=512,)()
        outer = solid.cylinder(r1=radius+(thickness/2.0),r2=radius+(thickness/2.0),h=thickness,segments=512,)()
        diff = solid.difference()(outer,inner)
        circles.append(diff)
    circles = solid.union()(*circles)
    circles = solid.translate([0,0,z_offset])(circles)
    return circles

def make_rack(wells,dims,grid_size,alignment_offset,rack_x,rack_y,rack_thickness,bolt_width,add_bolts=True):

    #get X and Y dimensions of gride of pipette tips
    X_len = dims[0]*grid_size[0]
    Y_len = dims[1]*grid_size[1]
    #make rack
    rack = solid.cube([rack_x,rack_y,rack_thickness],center=True)

    if add_bolts:
    #add bolt holes
        bolt_hole=solid.cylinder(r=bolt_width/2,h=rack_thickness,center=True)()
        bolt_holes = []
        bolt_holes.append(solid.translate([rack_x/2-1.5*bolt_width,rack_y/2-1.5*bolt_width])(bolt_hole))
        bolt_holes.append(solid.translate([-rack_x/2+1.5*bolt_width,rack_y/2-1.5*bolt_width])(bolt_hole))
        bolt_holes.append(solid.translate([-rack_x/2+1.5*bolt_width,-rack_y/2+1.5*bolt_width])(bolt_hole))
        bolt_holes.append(solid.translate([rack_x/2-1.5*bolt_width,-rack_y/2+1.5*bolt_width])(bolt_hole))
        bolt_holes = solid.union()(*bolt_holes)
        rack=solid.difference()(rack,bolt_holes)
    rack_support = rack

    #center rack with pipette holes
    rack = solid.translate([0,0,rack_thickness/2])(rack)
    rack = solid.translate([X_len/2,Y_len/2])(rack)
    rack = solid.translate([-alignment_offset[0],-alignment_offset[1]])(rack)
    wells = solid.linear_extrude(height=rack_thickness)(wells)
    rack = solid.difference()(rack,wells)
    return rack, rack_support

def make_pillar(wells,dims,grid_size,alignment_offset,rack_x,rack_y,pillar_height,rack_thickness,bolt_width,add_bolts=True,taper_angle=1,bolt_position_corner=1.5):

    #get X and Y dimensions of gride of pipette tips
    X_len = dims[0]*grid_size[0]
    Y_len = dims[1]*grid_size[1]
    #make rack
    rack = solid.cube([rack_x,rack_y,rack_thickness],center=True)
    
    if add_bolts:
    #add bolt holes
        bolt_hole=solid.cylinder(r=bolt_width/2,h=rack_thickness,center=True)()
        bolt_holes = []
        bolt_holes.append(solid.translate([rack_x/2-bolt_position_corner*bolt_width,rack_y/2-bolt_position_corner*bolt_width])(bolt_hole))
        bolt_holes.append(solid.translate([-rack_x/2+bolt_position_corner*bolt_width,rack_y/2-bolt_position_corner*bolt_width])(bolt_hole))
        bolt_holes.append(solid.translate([-rack_x/2+bolt_position_corner*bolt_width,-rack_y/2+bolt_position_corner*bolt_width])(bolt_hole))
        bolt_holes.append(solid.translate([rack_x/2-bolt_position_corner*bolt_width,-rack_y/2+bolt_position_corner*bolt_width])(bolt_hole))
        bolt_holes = solid.union()(*bolt_holes)
        rack=solid.difference()(rack,bolt_holes)
    rack_support = rack

    #center rack with pipette holes
    #rack = solid.translate([0,0,-rack_thickness])(rack)
    rack = solid.translate([X_len/2,Y_len/2])(rack)
    rack = solid.translate([-alignment_offset[0],-alignment_offset[1]])(rack)
    if not taper_angle == 0:
        wells=chamfer_extrude(pillar_height,taper_angle,segments=20)(wells)
    else:
        wells = solid.linear_extrude(height=pillar_height)(wells)
    rack = solid.union()(rack,wells)
    return rack, rack_support

def deg_taper_len(height,deg):
    if not deg == 0:
        return height*math.tan(math.radians(deg))
    else:
        return 0









 
 
************************************************/
